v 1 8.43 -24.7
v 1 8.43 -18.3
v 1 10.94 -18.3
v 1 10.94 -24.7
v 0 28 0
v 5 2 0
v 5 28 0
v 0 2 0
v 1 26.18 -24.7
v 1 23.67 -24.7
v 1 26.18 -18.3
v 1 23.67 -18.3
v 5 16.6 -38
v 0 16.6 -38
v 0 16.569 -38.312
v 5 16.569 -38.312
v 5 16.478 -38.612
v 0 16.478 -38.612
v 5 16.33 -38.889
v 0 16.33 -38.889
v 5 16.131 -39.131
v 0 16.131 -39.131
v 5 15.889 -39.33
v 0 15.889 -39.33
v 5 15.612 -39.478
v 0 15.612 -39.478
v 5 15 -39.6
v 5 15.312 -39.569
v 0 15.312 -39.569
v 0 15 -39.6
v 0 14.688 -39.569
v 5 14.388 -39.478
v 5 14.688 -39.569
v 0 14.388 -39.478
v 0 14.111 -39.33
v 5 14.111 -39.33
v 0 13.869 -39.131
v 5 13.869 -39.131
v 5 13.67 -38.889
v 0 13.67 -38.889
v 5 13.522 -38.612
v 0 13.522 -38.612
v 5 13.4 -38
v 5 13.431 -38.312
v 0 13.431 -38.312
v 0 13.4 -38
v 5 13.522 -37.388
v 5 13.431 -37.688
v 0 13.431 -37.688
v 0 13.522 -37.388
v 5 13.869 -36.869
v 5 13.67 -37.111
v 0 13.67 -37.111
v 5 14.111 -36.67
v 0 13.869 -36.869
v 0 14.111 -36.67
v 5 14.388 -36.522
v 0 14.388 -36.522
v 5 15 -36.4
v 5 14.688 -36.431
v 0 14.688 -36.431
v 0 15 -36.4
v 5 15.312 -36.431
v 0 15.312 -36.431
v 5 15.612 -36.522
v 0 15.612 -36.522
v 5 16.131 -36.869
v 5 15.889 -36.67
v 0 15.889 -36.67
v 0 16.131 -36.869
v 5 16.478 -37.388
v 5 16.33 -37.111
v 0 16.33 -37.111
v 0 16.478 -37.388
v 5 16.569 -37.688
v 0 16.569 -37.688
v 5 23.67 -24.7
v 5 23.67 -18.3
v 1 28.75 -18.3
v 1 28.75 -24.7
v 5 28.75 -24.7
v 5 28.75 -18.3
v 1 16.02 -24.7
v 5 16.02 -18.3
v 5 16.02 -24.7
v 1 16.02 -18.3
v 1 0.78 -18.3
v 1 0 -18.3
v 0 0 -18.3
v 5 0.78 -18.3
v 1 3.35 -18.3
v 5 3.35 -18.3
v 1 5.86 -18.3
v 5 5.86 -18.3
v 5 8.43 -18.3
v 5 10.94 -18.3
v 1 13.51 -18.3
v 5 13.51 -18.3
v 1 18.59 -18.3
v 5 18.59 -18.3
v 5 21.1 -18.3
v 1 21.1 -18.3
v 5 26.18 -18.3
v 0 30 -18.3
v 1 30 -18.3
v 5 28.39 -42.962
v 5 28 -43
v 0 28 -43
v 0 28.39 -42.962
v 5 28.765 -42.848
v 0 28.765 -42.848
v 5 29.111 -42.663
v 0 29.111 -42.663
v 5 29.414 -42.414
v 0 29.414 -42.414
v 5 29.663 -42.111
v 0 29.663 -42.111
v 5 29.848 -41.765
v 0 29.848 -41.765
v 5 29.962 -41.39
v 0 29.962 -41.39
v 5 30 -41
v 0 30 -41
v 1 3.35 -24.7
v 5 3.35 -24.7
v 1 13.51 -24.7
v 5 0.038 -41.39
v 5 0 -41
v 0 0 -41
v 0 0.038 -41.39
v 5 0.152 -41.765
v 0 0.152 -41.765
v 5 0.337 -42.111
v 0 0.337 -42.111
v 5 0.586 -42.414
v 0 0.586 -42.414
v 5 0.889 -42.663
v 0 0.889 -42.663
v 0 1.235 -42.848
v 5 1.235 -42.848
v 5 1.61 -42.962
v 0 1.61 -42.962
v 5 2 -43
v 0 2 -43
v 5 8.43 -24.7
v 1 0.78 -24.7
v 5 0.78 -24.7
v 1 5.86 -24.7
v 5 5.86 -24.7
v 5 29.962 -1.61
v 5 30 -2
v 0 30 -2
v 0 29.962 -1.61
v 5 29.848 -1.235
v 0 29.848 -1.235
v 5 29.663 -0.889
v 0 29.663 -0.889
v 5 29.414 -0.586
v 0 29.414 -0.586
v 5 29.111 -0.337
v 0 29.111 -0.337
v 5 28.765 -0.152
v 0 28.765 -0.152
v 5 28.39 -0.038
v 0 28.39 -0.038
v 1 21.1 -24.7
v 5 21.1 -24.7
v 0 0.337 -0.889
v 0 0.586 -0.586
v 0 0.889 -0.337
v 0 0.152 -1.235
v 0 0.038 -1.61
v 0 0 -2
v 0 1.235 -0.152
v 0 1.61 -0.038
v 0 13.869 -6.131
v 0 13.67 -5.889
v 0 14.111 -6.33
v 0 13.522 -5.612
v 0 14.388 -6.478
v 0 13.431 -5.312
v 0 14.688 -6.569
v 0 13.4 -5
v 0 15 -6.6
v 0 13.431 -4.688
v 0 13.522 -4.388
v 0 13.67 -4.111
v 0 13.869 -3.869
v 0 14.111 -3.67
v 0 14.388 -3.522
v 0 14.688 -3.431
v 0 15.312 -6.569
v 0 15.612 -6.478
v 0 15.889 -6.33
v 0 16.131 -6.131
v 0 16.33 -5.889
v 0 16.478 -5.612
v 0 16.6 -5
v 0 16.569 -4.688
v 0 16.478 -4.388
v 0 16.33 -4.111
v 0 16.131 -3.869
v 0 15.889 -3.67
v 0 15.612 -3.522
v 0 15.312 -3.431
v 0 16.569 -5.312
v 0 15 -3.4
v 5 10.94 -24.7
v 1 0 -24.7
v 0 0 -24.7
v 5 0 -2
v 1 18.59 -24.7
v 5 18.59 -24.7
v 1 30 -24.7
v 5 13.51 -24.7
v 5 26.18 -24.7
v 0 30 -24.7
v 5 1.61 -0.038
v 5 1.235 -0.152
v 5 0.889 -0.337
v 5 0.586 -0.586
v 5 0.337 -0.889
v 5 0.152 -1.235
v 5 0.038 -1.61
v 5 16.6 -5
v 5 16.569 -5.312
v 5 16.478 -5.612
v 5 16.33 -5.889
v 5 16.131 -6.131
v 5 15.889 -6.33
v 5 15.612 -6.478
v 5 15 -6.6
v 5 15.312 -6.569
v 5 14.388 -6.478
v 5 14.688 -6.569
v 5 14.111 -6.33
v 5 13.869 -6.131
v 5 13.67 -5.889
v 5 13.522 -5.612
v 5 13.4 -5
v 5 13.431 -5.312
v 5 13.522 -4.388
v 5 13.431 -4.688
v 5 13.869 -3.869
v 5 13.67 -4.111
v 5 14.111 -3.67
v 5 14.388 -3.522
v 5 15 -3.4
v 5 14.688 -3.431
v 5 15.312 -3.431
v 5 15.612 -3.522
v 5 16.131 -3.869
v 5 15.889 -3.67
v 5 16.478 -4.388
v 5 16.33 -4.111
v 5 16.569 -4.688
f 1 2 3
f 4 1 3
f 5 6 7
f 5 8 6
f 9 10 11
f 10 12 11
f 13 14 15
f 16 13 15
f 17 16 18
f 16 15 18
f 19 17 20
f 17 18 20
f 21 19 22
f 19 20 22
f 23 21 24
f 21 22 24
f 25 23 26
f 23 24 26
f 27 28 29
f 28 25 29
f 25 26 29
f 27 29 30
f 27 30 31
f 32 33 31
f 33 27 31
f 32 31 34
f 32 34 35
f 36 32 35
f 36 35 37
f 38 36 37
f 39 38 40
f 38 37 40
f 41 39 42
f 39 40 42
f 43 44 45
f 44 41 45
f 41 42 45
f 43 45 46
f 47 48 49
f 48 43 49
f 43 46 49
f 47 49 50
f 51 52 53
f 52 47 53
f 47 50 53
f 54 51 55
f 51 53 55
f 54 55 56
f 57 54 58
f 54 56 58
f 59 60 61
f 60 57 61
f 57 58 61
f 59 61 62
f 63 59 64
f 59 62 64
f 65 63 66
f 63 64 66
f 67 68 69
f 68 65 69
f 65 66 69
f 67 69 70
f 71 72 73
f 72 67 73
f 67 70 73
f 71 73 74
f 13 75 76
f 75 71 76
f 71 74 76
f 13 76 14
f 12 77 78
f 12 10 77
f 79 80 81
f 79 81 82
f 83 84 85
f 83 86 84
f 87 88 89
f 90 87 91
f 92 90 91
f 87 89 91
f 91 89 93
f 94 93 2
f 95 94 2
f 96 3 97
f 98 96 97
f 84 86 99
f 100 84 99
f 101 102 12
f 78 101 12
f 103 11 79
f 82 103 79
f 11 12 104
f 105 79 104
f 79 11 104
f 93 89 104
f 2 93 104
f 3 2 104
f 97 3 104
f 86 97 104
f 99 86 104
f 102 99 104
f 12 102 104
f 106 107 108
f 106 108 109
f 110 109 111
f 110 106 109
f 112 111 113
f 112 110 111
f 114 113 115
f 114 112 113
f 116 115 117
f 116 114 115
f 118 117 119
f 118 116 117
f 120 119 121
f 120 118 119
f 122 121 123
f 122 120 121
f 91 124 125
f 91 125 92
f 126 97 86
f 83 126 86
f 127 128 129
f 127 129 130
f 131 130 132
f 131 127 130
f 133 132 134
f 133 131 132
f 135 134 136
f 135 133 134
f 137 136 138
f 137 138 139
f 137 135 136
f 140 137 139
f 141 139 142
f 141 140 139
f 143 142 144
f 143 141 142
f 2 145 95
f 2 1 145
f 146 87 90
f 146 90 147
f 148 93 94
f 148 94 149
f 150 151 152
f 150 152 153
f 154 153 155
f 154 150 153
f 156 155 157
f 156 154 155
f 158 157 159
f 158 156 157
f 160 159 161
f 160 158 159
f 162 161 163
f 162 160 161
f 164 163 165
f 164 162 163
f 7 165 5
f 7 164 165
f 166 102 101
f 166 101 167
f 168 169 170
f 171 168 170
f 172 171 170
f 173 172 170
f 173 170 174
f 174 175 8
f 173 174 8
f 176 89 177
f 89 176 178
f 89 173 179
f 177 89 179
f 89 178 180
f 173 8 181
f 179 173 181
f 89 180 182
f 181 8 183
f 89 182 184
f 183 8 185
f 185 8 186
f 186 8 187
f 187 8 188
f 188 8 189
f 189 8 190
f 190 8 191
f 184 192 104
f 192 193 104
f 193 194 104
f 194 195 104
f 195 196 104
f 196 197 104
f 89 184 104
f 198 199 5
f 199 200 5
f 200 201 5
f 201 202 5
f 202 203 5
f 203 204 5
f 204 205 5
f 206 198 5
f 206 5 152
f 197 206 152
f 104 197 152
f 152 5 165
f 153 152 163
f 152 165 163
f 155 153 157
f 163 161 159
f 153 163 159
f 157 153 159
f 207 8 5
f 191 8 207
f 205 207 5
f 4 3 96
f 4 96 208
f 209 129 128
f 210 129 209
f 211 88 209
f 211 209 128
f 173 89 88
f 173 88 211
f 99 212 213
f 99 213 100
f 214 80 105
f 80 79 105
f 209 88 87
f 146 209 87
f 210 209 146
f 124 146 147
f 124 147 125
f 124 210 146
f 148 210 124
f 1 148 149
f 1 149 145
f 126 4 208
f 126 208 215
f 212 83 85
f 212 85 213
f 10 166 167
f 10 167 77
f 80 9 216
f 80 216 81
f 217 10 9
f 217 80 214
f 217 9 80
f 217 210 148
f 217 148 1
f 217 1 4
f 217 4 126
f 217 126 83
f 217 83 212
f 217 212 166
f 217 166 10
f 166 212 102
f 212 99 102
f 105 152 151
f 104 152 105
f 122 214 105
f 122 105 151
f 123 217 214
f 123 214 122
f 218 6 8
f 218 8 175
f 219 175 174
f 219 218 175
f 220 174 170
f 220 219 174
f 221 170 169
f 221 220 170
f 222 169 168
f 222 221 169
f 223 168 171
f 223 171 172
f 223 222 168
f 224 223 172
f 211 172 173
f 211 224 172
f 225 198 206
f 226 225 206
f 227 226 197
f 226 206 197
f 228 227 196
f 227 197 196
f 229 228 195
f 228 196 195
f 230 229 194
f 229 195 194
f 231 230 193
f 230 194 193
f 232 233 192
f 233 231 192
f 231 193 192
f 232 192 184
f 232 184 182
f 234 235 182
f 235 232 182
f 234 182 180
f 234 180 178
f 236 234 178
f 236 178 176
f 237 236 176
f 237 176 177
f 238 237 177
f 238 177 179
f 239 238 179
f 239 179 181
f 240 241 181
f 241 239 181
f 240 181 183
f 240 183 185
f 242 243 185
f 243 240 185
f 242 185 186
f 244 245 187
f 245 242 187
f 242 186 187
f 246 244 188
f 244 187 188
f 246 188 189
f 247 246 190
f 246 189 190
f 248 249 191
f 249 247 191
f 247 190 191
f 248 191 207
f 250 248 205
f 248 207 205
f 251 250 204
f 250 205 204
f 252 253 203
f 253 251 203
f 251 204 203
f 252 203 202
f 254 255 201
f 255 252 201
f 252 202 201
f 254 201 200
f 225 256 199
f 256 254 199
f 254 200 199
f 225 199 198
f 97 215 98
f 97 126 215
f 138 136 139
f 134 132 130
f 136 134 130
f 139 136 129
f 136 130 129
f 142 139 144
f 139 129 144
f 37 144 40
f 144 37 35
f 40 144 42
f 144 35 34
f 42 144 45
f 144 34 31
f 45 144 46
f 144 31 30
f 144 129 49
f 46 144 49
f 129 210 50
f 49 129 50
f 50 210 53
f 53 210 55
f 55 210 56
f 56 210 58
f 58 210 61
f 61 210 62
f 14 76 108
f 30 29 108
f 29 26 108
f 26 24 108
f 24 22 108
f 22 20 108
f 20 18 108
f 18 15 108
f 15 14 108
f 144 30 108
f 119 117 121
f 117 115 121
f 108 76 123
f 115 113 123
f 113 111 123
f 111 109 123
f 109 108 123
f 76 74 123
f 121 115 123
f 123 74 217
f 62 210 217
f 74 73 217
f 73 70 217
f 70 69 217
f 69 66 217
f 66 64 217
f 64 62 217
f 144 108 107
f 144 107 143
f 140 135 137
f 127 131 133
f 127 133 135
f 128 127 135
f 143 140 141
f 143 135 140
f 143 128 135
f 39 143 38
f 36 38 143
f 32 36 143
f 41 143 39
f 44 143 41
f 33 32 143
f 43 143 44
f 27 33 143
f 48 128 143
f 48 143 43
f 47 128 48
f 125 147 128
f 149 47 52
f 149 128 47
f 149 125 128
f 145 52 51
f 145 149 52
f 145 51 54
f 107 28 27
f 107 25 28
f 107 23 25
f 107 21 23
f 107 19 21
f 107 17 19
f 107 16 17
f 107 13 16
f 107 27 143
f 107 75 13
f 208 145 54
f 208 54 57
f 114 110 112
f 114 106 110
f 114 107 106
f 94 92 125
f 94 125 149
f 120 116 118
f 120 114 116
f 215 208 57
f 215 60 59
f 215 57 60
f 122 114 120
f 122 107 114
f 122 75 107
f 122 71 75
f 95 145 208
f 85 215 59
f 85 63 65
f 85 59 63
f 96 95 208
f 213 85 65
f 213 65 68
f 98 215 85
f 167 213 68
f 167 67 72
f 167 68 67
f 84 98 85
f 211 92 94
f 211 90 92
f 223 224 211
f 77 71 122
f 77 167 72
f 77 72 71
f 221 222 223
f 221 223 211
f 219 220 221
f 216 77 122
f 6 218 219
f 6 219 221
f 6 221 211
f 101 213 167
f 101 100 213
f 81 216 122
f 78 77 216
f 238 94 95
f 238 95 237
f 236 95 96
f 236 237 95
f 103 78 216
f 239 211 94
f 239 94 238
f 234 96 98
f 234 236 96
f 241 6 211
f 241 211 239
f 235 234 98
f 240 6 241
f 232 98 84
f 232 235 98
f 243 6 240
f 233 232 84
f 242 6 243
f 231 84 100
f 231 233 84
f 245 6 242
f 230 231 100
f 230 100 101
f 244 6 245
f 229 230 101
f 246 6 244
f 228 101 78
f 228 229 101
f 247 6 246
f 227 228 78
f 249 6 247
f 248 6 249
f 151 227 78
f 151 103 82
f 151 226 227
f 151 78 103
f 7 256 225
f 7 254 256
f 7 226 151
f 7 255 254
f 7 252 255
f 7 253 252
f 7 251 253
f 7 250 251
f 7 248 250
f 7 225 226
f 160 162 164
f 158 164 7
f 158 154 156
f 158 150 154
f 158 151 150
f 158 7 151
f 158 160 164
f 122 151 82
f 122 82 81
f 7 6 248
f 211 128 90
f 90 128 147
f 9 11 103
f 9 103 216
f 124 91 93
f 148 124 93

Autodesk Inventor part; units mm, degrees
ref_plane "YZ Plane" through (0, 0, 0) normal (1, 0, 0) x (0, 1, 0)
ref_plane "XZ Plane" through (0, 0, 0) normal (0, 1, 0) x (-1, 0, 0)
ref_plane "XY Plane" through (0, 0, 0) normal (0, 0, 1) x (1, 0, 0)
sketch "スケッチ1" plane through (0, 0, 0) normal (1, 0, 0) x (0, 1, 0)
  line L0 (0, 0) -> (30, 0)
  line L1 (30, 0) -> (30, -43)
  line L2 (30, -43) -> (0, -43)
  line L3 (0, -43) -> (0, 0)
  circle A0 centre (15, -5) radius 1.6
  circle A1 centre (15, -38) radius 1.6
  line L4 (28.75, -18.3) -> (26.18, -18.3)
  line L5 (26.18, -18.3) -> (26.18, -24.7)
  line L6 (26.18, -24.7) -> (28.75, -24.7)
  line L7 (28.75, -24.7) -> (28.75, -18.3)
  line L8 (30, -21.5) -> (0, -21.5)
  line L9 (23.67, -18.3) -> (21.1, -18.3)
  line L10 (21.1, -24.7) -> (23.67, -24.7)
  line L11 (23.67, -24.7) -> (23.67, -18.3)
  line L12 (21.1, -18.3) -> (21.1, -24.7)
  line L13 (18.59, -18.3) -> (16.02, -18.3)
  line L14 (16.02, -24.7) -> (18.59, -24.7)
  line L15 (18.59, -24.7) -> (18.59, -18.3)
  line L16 (16.02, -18.3) -> (16.02, -24.7)
  line L17 (13.51, -18.3) -> (10.94, -18.3)
  line L18 (10.94, -24.7) -> (13.51, -24.7)
  line L19 (13.51, -24.7) -> (13.51, -18.3)
  line L20 (10.94, -18.3) -> (10.94, -24.7)
  line L21 (8.43, -18.3) -> (5.86, -18.3)
  line L22 (5.86, -24.7) -> (8.43, -24.7)
  line L23 (8.43, -24.7) -> (8.43, -18.3)
  line L24 (5.86, -18.3) -> (5.86, -24.7)
  line L25 (3.35, -18.3) -> (0.78, -18.3)
  line L26 (0.78, -24.7) -> (3.35, -24.7)
  line L27 (3.35, -24.7) -> (3.35, -18.3)
  line L28 (0.78, -18.3) -> (0.78, -24.7)
  line L29 (30, -24.7) -> (0, -24.7)
  line L30 (0, -24.7) -> (0, -18.3)
  line L31 (0, -18.3) -> (30, -18.3)
  line L32 (30, -18.3) -> (30, -24.7)
  point P0 (0, -24.7)
  dimension "d0" = 30
  dimension "d1" = 43
  dimension "d2" = 3.2
  dimension "d3" = 3.2
  dimension "d4" = 5
  dimension "d5" = 15
  dimension "d6" = 15
  dimension "d7" = 5
  dimension "d8" = 2.57
  dimension "d9" = 6.4
  dimension "d10" = 3.2
  dimension "d11" = 1.25
  dimension "d14" = 5.08
  dimension "d22" = 0
  dimension "d23" = 0
extrude "押し出し1" add sketch "スケッチ1" along normal blind 5 contours L0 L1 L31 L4 L9 L13 L17 L21 L25 L3 | L31 L28 L8 L3 | L1 L8 L7 L31 | L8 L28 L29 L3 | L1 L29 L7 L8 | L29 L26 L22 L18 L14 L10 L6 L1 L2 L3 | L31 L24 L8 L27 | L5 L8 L11 L31 | L8 L24 L29 L27 | L5 L29 L11 L8 | L31 L20 L8 L23 | L12 L8 L15 L31 | L8 L20 L29 L23 | L12 L29 L15 L8 | L31 L16 L8 L19 | L8 L16 L29 L19
fillet "フィレット1" radius 2 4 edges at (2.5, 30, 0) (2.5, 0, 0) (2.5, 0, -43) (2.5, 30, -43)
extrude "押し出し2" cut sketch "スケッチ1" along normal blind 1 contours L31 L28 L8 L3 | L1 L8 L7 L31 | L8 L28 L29 L3 | L25 L27 L8 L28 | L1 L29 L7 L8 | L7 L8 L5 L4 | L8 L27 L26 L28 | L31 L24 L8 L27 | L7 L6 L5 L8 | L5 L8 L11 L31 | L8 L24 L29 L27 | L21 L23 L8 L24 | L5 L29 L11 L8 | L11 L8 L12 L9 | L8 L23 L22 L24 | L31 L20 L8 L23 | L11 L10 L12 L8 | L12 L8 L15 L31 | L8 L20 L29 L23 | L17 L19 L8 L20 | L12 L29 L15 L8 | L15 L8 L16 L13 | L8 L19 L18 L20 | L31 L16 L8 L19 | L15 L14 L16 L8 | L8 L16 L29 L19
equation "\"d6\" = d5"
equation "\"d7\" = d4"
properties part number "dribl-v3-3DP-3" material "ABS プラスチック"
